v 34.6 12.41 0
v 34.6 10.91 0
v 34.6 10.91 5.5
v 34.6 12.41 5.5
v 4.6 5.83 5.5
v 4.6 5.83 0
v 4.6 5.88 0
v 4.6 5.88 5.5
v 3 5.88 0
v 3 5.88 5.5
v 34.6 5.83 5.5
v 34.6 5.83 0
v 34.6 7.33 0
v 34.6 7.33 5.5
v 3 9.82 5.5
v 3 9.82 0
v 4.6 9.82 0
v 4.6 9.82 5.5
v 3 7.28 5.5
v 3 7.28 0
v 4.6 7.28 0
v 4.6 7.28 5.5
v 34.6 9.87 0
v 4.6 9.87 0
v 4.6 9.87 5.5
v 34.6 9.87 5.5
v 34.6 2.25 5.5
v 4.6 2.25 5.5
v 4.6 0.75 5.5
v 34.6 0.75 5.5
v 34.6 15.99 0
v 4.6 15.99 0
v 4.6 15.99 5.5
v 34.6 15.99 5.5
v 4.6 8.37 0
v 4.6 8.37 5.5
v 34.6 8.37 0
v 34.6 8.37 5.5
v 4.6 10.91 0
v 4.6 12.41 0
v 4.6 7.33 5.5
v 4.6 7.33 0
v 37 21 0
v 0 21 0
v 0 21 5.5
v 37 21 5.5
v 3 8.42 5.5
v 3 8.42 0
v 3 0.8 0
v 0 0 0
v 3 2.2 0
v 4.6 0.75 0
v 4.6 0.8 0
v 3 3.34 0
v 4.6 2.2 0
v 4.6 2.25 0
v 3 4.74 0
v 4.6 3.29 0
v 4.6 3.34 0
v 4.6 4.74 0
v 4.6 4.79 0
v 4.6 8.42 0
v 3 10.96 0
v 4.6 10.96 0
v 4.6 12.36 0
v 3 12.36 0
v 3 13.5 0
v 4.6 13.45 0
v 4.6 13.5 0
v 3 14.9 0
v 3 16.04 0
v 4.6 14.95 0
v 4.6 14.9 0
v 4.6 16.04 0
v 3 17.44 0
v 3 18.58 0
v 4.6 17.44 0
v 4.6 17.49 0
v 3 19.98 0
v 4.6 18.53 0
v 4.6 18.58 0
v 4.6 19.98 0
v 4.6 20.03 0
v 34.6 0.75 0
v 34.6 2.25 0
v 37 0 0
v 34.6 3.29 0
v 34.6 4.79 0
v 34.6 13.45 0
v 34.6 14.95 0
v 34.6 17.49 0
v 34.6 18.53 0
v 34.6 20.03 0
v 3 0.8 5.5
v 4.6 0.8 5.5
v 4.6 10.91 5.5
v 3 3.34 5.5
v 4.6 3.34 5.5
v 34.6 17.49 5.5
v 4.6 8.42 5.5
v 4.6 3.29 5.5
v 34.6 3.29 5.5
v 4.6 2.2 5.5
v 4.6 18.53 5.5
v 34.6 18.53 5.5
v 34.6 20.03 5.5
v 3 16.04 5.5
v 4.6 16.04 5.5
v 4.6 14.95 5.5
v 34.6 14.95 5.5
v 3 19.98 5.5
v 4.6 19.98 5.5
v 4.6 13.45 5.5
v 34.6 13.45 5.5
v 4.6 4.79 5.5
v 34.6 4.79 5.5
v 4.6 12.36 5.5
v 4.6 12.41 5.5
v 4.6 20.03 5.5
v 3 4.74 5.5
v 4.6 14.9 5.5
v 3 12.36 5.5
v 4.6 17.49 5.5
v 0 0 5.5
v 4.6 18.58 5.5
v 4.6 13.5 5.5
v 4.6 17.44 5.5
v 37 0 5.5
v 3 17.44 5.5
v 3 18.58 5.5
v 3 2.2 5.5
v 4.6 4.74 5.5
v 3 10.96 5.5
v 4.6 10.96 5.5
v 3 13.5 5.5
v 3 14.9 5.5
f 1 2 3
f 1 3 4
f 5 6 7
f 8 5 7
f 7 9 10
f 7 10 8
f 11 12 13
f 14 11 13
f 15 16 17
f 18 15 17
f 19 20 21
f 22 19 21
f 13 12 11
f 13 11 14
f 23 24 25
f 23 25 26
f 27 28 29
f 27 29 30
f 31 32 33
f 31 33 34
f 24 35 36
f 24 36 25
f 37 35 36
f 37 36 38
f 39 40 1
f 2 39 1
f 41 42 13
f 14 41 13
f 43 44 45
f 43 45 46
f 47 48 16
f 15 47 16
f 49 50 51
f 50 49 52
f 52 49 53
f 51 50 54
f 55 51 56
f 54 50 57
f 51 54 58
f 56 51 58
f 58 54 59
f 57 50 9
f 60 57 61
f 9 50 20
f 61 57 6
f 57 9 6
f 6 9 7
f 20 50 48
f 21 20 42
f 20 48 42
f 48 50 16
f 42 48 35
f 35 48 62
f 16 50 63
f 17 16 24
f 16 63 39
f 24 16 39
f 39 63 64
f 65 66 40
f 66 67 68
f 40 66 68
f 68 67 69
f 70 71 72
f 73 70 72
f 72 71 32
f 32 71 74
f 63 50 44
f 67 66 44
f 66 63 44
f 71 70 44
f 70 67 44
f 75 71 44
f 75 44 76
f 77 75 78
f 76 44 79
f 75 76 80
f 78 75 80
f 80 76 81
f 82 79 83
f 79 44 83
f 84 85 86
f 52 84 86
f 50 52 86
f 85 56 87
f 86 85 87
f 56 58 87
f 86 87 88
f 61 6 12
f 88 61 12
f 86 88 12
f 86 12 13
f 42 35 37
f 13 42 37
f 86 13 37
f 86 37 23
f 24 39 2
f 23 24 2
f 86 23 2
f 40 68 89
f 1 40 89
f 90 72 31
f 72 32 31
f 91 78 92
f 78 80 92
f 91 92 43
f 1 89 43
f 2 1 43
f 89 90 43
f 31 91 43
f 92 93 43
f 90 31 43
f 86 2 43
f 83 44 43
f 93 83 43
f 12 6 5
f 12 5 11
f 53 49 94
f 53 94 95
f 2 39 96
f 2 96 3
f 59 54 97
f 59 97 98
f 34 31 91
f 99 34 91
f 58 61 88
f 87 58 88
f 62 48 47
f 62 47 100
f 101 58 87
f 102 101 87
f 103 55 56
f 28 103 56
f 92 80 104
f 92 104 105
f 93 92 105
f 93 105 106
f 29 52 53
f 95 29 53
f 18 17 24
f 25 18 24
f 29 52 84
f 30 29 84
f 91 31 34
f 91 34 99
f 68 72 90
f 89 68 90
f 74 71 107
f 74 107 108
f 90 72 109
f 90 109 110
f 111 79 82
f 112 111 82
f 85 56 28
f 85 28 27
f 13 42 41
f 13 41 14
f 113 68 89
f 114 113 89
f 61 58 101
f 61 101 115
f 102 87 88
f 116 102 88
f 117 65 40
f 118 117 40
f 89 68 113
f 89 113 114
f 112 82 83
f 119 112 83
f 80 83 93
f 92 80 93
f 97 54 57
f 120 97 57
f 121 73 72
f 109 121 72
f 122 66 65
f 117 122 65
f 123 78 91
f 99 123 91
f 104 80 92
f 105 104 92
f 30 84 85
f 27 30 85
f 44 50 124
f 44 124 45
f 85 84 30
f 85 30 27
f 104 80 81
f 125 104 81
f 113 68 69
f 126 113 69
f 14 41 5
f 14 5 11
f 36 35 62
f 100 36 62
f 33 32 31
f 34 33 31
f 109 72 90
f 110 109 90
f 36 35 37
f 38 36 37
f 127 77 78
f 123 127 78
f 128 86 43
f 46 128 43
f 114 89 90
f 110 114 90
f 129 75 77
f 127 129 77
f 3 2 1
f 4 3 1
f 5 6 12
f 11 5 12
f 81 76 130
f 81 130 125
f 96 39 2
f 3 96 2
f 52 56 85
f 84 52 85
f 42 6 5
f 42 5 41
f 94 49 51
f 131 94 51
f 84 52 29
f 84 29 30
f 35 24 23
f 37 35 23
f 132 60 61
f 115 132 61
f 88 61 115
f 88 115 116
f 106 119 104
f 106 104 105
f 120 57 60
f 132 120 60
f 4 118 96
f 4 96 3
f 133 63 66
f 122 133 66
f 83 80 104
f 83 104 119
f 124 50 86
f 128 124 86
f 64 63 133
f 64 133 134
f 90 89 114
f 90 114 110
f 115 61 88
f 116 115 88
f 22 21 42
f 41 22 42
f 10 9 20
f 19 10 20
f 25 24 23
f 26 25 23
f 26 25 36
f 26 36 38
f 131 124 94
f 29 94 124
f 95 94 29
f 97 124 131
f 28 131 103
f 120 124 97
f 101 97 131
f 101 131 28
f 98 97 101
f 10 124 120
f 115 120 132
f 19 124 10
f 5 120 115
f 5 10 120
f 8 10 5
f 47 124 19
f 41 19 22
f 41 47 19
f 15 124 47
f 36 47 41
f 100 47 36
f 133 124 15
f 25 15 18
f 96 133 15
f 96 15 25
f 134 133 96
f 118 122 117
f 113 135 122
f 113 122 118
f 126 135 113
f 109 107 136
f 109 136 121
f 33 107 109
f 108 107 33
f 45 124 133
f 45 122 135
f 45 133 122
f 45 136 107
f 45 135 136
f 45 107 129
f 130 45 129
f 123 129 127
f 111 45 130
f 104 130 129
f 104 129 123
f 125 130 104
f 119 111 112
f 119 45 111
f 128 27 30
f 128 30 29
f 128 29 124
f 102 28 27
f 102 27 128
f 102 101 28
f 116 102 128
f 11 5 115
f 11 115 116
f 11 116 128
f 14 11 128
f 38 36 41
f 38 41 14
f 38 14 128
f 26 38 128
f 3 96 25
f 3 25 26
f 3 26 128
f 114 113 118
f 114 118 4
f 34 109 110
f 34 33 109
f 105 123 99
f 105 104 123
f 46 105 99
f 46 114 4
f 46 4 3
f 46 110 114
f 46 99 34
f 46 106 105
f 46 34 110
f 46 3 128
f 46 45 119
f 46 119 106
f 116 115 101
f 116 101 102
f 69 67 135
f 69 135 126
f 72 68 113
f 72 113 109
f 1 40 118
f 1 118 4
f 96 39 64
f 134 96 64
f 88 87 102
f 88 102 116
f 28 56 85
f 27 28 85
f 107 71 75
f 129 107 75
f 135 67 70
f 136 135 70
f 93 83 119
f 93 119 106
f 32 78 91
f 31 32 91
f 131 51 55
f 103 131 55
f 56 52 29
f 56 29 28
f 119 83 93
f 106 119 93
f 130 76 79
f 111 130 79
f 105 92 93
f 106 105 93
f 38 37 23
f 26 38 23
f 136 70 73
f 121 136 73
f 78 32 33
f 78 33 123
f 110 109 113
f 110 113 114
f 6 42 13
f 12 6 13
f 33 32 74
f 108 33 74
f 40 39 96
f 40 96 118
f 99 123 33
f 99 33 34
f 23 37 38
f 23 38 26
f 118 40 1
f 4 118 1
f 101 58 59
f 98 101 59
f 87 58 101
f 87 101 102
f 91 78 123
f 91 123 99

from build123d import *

# Parameters (mm, degrees)
BOX010_W     = 30
BOX010_H     = 1.5
BOX010_DEPTH = 5.5
BOX011_W     = 30
BOX011_H     = 1.5
BOX011_DEPTH = 5.5
BOX012_W     = 30
BOX012_H     = 1.5
BOX012_DEPTH = 5.5
BOX013_W     = 30
BOX013_H     = 1.5
BOX013_DEPTH = 5.5
BOX014_W     = 30
BOX014_H     = 1.5
BOX014_DEPTH = 5.5
BOX015_W     = 30
BOX015_H     = 1.5
BOX015_DEPTH = 5.5
BOX016_W     = 30
BOX016_H     = 1.5
BOX016_DEPTH = 5.5
BOX009_W     = 30
BOX009_H     = 1.5
BOX009_DEPTH = 5.5
BOX018_W     = 30
BOX018_H     = 1.5
BOX018_DEPTH = 5.5
BOX019_W     = 30
BOX019_H     = 1.5
BOX019_DEPTH = 5.5
BOX020_W     = 30
BOX020_H     = 1.5
BOX020_DEPTH = 5.5
BOX021_W     = 30
BOX021_H     = 1.5
BOX021_DEPTH = 5.5
BOX022_W     = 30
BOX022_H     = 1.5
BOX022_DEPTH = 5.5
BOX023_W     = 30
BOX023_H     = 1.5
BOX023_DEPTH = 5.5
BOX024_W     = 30
BOX024_H     = 1.5
BOX024_DEPTH = 5.5
BOX017_W     = 30
BOX017_H     = 1.5
BOX017_DEPTH = 5.5
BOX002_W     = 1.6
BOX002_H     = 1.4
BOX002_DEPTH = 10
BOX003_W     = 1.6
BOX003_H     = 1.4
BOX003_DEPTH = 10
BOX004_W     = 1.6
BOX004_H     = 1.4
BOX004_DEPTH = 10
BOX005_W     = 1.6
BOX005_H     = 1.4
BOX005_DEPTH = 10
BOX006_W     = 1.6
BOX006_H     = 1.4
BOX006_DEPTH = 10
BOX007_W     = 1.6
BOX007_H     = 1.4
BOX007_DEPTH = 10
BOX008_W     = 1.6
BOX008_H     = 1.4
BOX008_DEPTH = 10
BOX001_W     = 1.6
BOX001_H     = 1.4
BOX001_DEPTH = 10
BOX_W        = 37
BOX_H        = 21
BOX_DEPTH    = 5.5


with BuildPart() as cube010:
    # Box010 → Box010 (new body)
    with BuildSketch(Plane(origin=(4.6, 3.29, 0), x_dir=(1, 0, 0), z_dir=(0, 0, 1))):
        with Locations((15, 0.75)):
            Rectangle(BOX010_W, BOX010_H)
    extrude(amount=BOX010_DEPTH)


with BuildPart() as cube011:
    # Box011 → Box011 (new body)
    with BuildSketch(Plane(origin=(4.6, 5.83, 0), x_dir=(1, 0, 0), z_dir=(0, 0, 1))):
        with Locations((15, 0.75)):
            Rectangle(BOX011_W, BOX011_H)
    extrude(amount=BOX011_DEPTH)


with BuildPart() as cube012:
    # Box012 → Box012 (new body)
    with BuildSketch(Plane(origin=(4.6, 8.37, 0), x_dir=(1, 0, 0), z_dir=(0, 0, 1))):
        with Locations((15, 0.75)):
            Rectangle(BOX012_W, BOX012_H)
    extrude(amount=BOX012_DEPTH)


with BuildPart() as cube013:
    # Box013 → Box013 (new body)
    with BuildSketch(Plane(origin=(4.6, 10.91, 0), x_dir=(1, 0, 0), z_dir=(0, 0, 1))):
        with Locations((15, 0.75)):
            Rectangle(BOX013_W, BOX013_H)
    extrude(amount=BOX013_DEPTH)


with BuildPart() as cube014:
    # Box014 → Box014 (new body)
    with BuildSketch(Plane(origin=(4.6, 13.45, 0), x_dir=(1, 0, 0), z_dir=(0, 0, 1))):
        with Locations((15, 0.75)):
            Rectangle(BOX014_W, BOX014_H)
    extrude(amount=BOX014_DEPTH)


with BuildPart() as cube015:
    # Box015 → Box015 (new body)
    with BuildSketch(Plane(origin=(4.6, 15.99, 0), x_dir=(1, 0, 0), z_dir=(0, 0, 1))):
        with Locations((15, 0.75)):
            Rectangle(BOX015_W, BOX015_H)
    extrude(amount=BOX015_DEPTH)


with BuildPart() as cube016:
    # Box016 → Box016 (new body)
    with BuildSketch(Plane(origin=(4.6, 18.53, 0), x_dir=(1, 0, 0), z_dir=(0, 0, 1))):
        with Locations((15, 0.75)):
            Rectangle(BOX016_W, BOX016_H)
    extrude(amount=BOX016_DEPTH)


with BuildPart() as conducting_filament:
    # Box009 → Box009 (new body)
    with BuildSketch(Plane(origin=(4.6, 0.75, 0), x_dir=(1, 0, 0), z_dir=(0, 0, 1))):
        with Locations((15, 0.75)):
            Rectangle(BOX009_W, BOX009_H)
    extrude(amount=BOX009_DEPTH)

    # Fusion: union Cube010, Cube011, Cube012, Cube013, Cube014, Cube015, Cube016
    add(cube010.part)
    add(cube011.part)
    add(cube012.part)
    add(cube013.part)
    add(cube014.part)
    add(cube015.part)
    add(cube016.part)


with BuildPart() as cube018:
    # Box018 → Box018 (new body)
    with BuildSketch(Plane(origin=(4.6, 10.91, 0), x_dir=(1, 0, 0), z_dir=(0, 0, 1))):
        with Locations((15, 0.75)):
            Rectangle(BOX018_W, BOX018_H)
    extrude(amount=BOX018_DEPTH)


with BuildPart() as cube019:
    # Box019 → Box019 (new body)
    with BuildSketch(Plane(origin=(4.6, 3.29, 0), x_dir=(1, 0, 0), z_dir=(0, 0, 1))):
        with Locations((15, 0.75)):
            Rectangle(BOX019_W, BOX019_H)
    extrude(amount=BOX019_DEPTH)


with BuildPart() as cube020:
    # Box020 → Box020 (new body)
    with BuildSketch(Plane(origin=(4.6, 5.83, 0), x_dir=(1, 0, 0), z_dir=(0, 0, 1))):
        with Locations((15, 0.75)):
            Rectangle(BOX020_W, BOX020_H)
    extrude(amount=BOX020_DEPTH)


with BuildPart() as cube021:
    # Box021 → Box021 (new body)
    with BuildSketch(Plane(origin=(4.6, 18.53, 0), x_dir=(1, 0, 0), z_dir=(0, 0, 1))):
        with Locations((15, 0.75)):
            Rectangle(BOX021_W, BOX021_H)
    extrude(amount=BOX021_DEPTH)


with BuildPart() as cube022:
    # Box022 → Box022 (new body)
    with BuildSketch(Plane(origin=(4.6, 15.99, 0), x_dir=(1, 0, 0), z_dir=(0, 0, 1))):
        with Locations((15, 0.75)):
            Rectangle(BOX022_W, BOX022_H)
    extrude(amount=BOX022_DEPTH)


with BuildPart() as cube023:
    # Box023 → Box023 (new body)
    with BuildSketch(Plane(origin=(4.6, 8.37, 0), x_dir=(1, 0, 0), z_dir=(0, 0, 1))):
        with Locations((15, 0.75)):
            Rectangle(BOX023_W, BOX023_H)
    extrude(amount=BOX023_DEPTH)


with BuildPart() as cube024:
    # Box024 → Box024 (new body)
    with BuildSketch(Plane(origin=(4.6, 13.45, 0), x_dir=(1, 0, 0), z_dir=(0, 0, 1))):
        with Locations((15, 0.75)):
            Rectangle(BOX024_W, BOX024_H)
    extrude(amount=BOX024_DEPTH)


with BuildPart() as fusion002:
    # Box017 → Box017 (new body)
    with BuildSketch(Plane(origin=(4.6, 0.75, 0), x_dir=(1, 0, 0), z_dir=(0, 0, 1))):
        with Locations((15, 0.75)):
            Rectangle(BOX017_W, BOX017_H)
    extrude(amount=BOX017_DEPTH)

    # Fusion002: union Cube018, Cube019, Cube020, Cube021, Cube022, Cube023, Cube024
    add(cube018.part)
    add(cube019.part)
    add(cube020.part)
    add(cube021.part)
    add(cube022.part)
    add(cube023.part)
    add(cube024.part)


with BuildPart() as cube002:
    # Box002 → Box002 (new body)
    with BuildSketch(Plane(origin=(3, 3.34, -3), x_dir=(1, 0, 0), z_dir=(0, 0, 1))):
        with Locations((0.8, 0.7)):
            Rectangle(BOX002_W, BOX002_H)
    extrude(amount=BOX002_DEPTH)


with BuildPart() as cube003:
    # Box003 → Box003 (new body)
    with BuildSketch(Plane(origin=(3, 5.88, -3), x_dir=(1, 0, 0), z_dir=(0, 0, 1))):
        with Locations((0.8, 0.7)):
            Rectangle(BOX003_W, BOX003_H)
    extrude(amount=BOX003_DEPTH)


with BuildPart() as cube004:
    # Box004 → Box004 (new body)
    with BuildSketch(Plane(origin=(3, 8.42, -3), x_dir=(1, 0, 0), z_dir=(0, 0, 1))):
        with Locations((0.8, 0.7)):
            Rectangle(BOX004_W, BOX004_H)
    extrude(amount=BOX004_DEPTH)


with BuildPart() as cube005:
    # Box005 → Box005 (new body)
    with BuildSketch(Plane(origin=(3, 10.96, -3), x_dir=(1, 0, 0), z_dir=(0, 0, 1))):
        with Locations((0.8, 0.7)):
            Rectangle(BOX005_W, BOX005_H)
    extrude(amount=BOX005_DEPTH)


with BuildPart() as cube006:
    # Box006 → Box006 (new body)
    with BuildSketch(Plane(origin=(3, 13.5, -3), x_dir=(1, 0, 0), z_dir=(0, 0, 1))):
        with Locations((0.8, 0.7)):
            Rectangle(BOX006_W, BOX006_H)
    extrude(amount=BOX006_DEPTH)


with BuildPart() as cube007:
    # Box007 → Box007 (new body)
    with BuildSketch(Plane(origin=(3, 16.04, -3), x_dir=(1, 0, 0), z_dir=(0, 0, 1))):
        with Locations((0.8, 0.7)):
            Rectangle(BOX007_W, BOX007_H)
    extrude(amount=BOX007_DEPTH)


with BuildPart() as cube008:
    # Box008 → Box008 (new body)
    with BuildSketch(Plane(origin=(3, 18.58, -3), x_dir=(1, 0, 0), z_dir=(0, 0, 1))):
        with Locations((0.8, 0.7)):
            Rectangle(BOX008_W, BOX008_H)
    extrude(amount=BOX008_DEPTH)


with BuildPart() as fusion001:
    # Box001 → Box001 (new body)
    with BuildSketch(Plane(origin=(3, 0.8, -3), x_dir=(1, 0, 0), z_dir=(0, 0, 1))):
        with Locations((0.8, 0.7)):
            Rectangle(BOX001_W, BOX001_H)
    extrude(amount=BOX001_DEPTH)

    # Fusion001: union Cube002, Cube003, Cube004, Cube005, Cube006, Cube007, Cube008
    add(cube002.part)
    add(cube003.part)
    add(cube004.part)
    add(cube005.part)
    add(cube006.part)
    add(cube007.part)
    add(cube008.part)


with BuildPart() as main_body:
    # Box → Box (new body)
    with BuildSketch(Plane.XY):
        with Locations((18.5, 10.5)):
            Rectangle(BOX_W, BOX_H)
    extrude(amount=BOX_DEPTH)

    # Cut: cut Fusion001
    add(fusion001.part, mode=Mode.SUBTRACT)

    # Cut001: cut Fusion002
    add(fusion002.part, mode=Mode.SUBTRACT)


solid = Compound([conducting_filament.part, main_body.part])
